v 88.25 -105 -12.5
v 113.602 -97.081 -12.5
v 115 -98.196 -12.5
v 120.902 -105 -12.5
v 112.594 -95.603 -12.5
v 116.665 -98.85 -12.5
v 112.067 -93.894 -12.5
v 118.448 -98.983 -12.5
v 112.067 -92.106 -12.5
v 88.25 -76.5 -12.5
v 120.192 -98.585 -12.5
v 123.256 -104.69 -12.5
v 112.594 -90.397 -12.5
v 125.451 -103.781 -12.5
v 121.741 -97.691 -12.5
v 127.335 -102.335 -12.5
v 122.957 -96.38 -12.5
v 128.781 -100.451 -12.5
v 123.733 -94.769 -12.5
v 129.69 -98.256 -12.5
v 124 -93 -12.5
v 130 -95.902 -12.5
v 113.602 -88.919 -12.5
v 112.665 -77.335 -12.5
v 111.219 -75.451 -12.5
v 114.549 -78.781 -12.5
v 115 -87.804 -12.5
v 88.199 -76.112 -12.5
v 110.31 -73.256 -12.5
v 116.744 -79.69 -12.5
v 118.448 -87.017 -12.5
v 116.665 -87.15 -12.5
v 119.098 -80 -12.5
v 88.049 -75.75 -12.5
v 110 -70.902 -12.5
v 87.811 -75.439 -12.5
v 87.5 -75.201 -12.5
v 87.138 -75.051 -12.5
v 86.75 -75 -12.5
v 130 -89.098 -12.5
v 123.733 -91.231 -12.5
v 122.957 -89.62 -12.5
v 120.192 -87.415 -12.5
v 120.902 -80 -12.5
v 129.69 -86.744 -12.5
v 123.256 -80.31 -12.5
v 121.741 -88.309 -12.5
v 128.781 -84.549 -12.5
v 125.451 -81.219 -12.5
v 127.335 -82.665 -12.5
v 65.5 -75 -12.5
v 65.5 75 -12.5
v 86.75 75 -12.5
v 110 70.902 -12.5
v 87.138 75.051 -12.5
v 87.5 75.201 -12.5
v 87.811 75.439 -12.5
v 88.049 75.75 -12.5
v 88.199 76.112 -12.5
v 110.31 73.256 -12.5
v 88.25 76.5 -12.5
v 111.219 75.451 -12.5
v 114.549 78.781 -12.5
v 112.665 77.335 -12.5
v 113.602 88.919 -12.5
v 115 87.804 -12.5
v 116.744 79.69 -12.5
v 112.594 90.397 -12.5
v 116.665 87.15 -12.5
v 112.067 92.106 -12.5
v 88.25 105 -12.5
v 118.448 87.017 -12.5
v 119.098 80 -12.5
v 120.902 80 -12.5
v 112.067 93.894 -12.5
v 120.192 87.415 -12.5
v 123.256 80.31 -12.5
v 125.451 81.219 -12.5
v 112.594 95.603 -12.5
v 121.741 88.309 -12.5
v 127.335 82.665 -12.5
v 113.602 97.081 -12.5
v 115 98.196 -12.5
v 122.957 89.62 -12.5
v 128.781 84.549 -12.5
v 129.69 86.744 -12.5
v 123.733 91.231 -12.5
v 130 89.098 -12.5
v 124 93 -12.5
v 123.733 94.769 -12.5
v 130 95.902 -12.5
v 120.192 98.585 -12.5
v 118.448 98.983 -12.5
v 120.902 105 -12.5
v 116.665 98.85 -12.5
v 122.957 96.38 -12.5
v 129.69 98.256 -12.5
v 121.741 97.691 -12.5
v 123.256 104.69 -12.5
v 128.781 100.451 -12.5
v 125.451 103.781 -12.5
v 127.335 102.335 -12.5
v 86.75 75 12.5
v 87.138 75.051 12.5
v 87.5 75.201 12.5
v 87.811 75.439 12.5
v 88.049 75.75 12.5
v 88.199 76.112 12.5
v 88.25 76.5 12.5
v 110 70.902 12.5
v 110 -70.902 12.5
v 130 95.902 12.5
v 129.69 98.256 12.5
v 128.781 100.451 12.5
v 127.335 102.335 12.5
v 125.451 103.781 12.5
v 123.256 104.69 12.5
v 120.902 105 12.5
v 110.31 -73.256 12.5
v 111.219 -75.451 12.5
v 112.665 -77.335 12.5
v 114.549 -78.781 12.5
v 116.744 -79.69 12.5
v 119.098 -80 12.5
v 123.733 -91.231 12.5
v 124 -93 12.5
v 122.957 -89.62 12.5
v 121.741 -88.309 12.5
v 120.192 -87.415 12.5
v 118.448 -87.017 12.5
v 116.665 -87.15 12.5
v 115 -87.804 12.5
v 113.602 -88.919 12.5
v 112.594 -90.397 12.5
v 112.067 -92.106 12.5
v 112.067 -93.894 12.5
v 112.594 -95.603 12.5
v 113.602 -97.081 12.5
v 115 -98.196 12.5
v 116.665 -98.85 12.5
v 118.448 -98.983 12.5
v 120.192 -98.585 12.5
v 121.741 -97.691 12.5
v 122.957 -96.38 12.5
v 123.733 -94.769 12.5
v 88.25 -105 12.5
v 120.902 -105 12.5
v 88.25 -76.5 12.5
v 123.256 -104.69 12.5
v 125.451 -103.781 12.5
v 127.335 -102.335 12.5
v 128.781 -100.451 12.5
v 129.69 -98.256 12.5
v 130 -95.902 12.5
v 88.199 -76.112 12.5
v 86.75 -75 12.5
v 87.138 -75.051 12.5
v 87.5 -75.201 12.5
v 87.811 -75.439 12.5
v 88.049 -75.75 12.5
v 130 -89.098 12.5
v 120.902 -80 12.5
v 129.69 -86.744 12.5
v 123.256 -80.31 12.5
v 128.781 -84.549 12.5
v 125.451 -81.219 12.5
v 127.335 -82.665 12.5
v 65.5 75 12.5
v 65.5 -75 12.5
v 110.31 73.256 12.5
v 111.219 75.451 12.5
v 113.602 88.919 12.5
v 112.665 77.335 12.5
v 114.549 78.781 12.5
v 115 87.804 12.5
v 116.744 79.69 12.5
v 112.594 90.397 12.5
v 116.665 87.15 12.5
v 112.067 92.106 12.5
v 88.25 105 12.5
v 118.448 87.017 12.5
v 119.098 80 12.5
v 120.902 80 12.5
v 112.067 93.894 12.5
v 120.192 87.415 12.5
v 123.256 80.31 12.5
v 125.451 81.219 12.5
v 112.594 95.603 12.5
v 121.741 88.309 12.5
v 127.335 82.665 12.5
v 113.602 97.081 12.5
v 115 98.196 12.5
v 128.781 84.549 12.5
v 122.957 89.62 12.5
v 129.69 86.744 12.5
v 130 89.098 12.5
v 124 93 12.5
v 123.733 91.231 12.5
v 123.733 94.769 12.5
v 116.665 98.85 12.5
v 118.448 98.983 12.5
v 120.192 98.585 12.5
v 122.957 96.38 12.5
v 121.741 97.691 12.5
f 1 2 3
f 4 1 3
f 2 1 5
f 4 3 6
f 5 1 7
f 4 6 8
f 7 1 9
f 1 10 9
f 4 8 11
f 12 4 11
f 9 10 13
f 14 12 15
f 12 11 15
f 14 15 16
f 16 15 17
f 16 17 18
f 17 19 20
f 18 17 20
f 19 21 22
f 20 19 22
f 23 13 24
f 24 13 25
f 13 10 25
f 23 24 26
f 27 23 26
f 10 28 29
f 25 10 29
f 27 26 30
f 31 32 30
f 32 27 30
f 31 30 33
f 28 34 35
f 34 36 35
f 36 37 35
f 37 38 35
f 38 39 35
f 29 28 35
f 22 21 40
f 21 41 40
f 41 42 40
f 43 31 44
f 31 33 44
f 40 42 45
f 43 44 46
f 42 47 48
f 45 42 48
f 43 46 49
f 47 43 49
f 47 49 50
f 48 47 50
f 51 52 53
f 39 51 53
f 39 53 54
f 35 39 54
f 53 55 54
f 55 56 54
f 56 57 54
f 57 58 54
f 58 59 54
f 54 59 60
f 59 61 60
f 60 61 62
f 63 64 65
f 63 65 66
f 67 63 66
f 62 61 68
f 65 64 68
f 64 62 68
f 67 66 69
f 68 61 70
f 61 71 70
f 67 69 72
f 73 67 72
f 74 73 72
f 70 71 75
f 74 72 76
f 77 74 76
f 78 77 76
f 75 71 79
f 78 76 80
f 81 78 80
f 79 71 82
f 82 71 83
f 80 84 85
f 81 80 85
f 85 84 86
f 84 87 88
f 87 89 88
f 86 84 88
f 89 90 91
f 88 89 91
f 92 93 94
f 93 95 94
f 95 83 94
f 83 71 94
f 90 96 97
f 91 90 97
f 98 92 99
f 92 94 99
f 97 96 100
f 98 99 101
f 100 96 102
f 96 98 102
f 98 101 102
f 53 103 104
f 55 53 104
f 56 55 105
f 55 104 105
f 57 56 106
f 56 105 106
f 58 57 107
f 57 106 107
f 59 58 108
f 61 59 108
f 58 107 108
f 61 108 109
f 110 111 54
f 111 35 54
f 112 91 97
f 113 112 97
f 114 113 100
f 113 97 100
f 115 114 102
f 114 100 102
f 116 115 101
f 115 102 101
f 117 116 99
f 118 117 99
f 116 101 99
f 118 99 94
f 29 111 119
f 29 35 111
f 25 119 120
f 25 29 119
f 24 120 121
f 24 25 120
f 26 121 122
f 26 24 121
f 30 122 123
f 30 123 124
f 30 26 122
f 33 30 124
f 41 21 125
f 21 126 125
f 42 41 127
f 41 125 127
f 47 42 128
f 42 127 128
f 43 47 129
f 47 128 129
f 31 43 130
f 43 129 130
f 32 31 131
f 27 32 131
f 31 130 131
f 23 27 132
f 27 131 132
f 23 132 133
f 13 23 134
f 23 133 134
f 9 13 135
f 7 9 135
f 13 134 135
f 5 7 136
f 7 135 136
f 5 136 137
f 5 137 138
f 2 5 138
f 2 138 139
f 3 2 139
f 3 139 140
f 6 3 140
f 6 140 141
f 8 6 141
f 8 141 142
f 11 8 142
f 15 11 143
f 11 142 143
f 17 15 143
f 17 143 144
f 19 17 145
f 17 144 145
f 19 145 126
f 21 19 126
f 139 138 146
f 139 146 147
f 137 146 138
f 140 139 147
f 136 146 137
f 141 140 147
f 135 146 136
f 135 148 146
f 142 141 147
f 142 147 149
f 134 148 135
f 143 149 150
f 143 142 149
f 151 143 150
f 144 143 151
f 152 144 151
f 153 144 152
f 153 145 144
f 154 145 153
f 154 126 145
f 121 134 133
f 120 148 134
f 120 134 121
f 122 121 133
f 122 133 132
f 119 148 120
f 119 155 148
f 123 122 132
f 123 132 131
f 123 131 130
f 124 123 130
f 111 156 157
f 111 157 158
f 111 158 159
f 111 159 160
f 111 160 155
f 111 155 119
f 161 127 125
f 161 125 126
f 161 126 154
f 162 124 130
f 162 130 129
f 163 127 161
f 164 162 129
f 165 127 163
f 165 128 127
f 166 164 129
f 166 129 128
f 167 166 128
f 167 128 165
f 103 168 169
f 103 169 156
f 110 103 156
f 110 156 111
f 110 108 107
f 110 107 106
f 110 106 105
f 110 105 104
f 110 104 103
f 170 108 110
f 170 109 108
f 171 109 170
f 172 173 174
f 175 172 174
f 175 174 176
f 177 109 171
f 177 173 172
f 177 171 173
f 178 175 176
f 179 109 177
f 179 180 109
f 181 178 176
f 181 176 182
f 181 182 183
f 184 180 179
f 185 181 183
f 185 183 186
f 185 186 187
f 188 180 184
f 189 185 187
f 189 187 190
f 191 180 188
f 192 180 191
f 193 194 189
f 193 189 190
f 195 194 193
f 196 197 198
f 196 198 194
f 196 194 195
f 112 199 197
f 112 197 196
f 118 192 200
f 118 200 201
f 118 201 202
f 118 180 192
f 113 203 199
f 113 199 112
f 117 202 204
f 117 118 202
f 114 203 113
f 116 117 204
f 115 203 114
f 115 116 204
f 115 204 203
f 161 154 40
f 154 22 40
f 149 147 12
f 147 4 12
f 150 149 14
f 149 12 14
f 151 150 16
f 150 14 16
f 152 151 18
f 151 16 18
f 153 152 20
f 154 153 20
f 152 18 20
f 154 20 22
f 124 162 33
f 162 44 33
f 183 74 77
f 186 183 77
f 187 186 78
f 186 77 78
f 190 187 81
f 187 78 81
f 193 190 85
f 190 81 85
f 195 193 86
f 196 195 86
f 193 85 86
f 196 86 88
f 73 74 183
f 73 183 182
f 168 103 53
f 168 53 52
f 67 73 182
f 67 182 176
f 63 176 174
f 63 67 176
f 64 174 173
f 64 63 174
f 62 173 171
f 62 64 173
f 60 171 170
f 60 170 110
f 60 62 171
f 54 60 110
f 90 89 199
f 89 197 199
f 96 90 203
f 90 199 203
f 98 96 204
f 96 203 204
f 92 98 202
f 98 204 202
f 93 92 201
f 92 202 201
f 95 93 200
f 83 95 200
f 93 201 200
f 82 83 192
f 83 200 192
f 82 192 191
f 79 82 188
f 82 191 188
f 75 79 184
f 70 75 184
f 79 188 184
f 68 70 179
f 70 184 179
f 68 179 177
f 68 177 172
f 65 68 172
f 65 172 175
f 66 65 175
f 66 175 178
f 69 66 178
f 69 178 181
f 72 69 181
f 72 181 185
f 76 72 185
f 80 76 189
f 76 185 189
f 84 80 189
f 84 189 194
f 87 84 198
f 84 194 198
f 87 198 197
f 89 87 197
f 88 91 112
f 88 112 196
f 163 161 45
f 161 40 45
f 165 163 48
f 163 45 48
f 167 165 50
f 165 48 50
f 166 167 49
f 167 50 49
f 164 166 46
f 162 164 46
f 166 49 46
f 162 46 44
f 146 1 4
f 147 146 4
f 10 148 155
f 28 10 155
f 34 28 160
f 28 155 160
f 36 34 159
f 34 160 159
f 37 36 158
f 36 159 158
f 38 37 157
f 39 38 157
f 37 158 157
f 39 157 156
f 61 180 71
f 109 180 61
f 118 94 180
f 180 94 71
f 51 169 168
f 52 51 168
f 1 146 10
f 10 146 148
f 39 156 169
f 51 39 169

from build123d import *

# Parameters (mm, degrees)
SKETCH021_R          = 33
PAD018_DEPTH         = 12.5
PAD018_DEPTH_BACK    = 12.5
SKETCH_004_R         = 6
POCKET021_DEPTH      = 20
POCKET021_DEPTH_BACK = 20
SKETCH035_W          = 175.5
SKETCH035_H          = 210
POCKET022_DEPTH      = 20
POCKET022_DEPTH_BACK = 20


with BuildPart() as part:
    # Sketch021 → Pad018 (new body, two sides)
    with BuildSketch(Plane.XY) as pad018_sk:
        with BuildLine():
            Line((-110, -105), (110, -105))
            Line((110, -105), (120.90162, -105))
            ThreePointArc((120.90162, -105), (127.335146, -102.335146), (130, -95.90162))
            Line((130, -95.90162), (130, -89.09838))
            ThreePointArc((130, -89.09838), (127.335146, -82.664854), (120.90162, -80))
            Line((120.90162, -80), (119.09838, -80))
            ThreePointArc((110, -70.90162), (112.664854, -77.335146), (119.09838, -80))
            Line((110, -70.90162), (110, 0))
            Line((110, 70.90162), (110, 0))
            ThreePointArc((119.09838, 80), (112.664854, 77.335146), (110, 70.90162))
            Line((120.90162, 80), (119.09838, 80))
            ThreePointArc((120.90162, 80), (127.335146, 82.664854), (130, 89.09838))
            Line((130, 95.90162), (130, 89.09838))
            ThreePointArc((130, 95.90162), (127.335146, 102.335146), (120.90162, 105))
            Line((110, 105), (120.90162, 105))
            Line((110, 105), (-110, 105))
            Line((-110, 105), (-110, 0))
            Line((-110, -105), (-110, 0))
        make_face()
        Circle(SKETCH021_R, mode=Mode.SUBTRACT)
    extrude(amount=-PAD018_DEPTH)
    extrude(pad018_sk.sketch, amount=PAD018_DEPTH_BACK)

    # Sketch_004 → Pocket021 (cut, two sides)
    with BuildSketch(Plane.XY) as pocket021_sk:
        with Locations((-118, 93)):
            Circle(SKETCH_004_R)
        with Locations((118, 93)):
            Circle(SKETCH_004_R)
        with Locations((-118, -93)):
            Circle(SKETCH_004_R)
        with Locations((118, -93)):
            Circle(SKETCH_004_R)
        with BuildLine():
            ThreePointArc((86.75, 75), (87.81066, 75.43934), (88.25, 76.5))
            Line((88.25, 105), (88.25, 76.5))
            Line((88.25, 105), (6.75, 105))
            Line((6.75, 105), (6.75, 76.5))
            ThreePointArc((6.75, 76.5), (7.18934, 75.43934), (8.25, 75))
            Line((86.75, 75), (8.25, 75))
        make_face()
        with BuildLine():
            ThreePointArc((-88.25, 76.5), (-87.81066, 75.43934), (-86.75, 75))
            Line((-86.75, 75), (-8.25, 75))
            ThreePointArc((-8.25, 75), (-7.18934, 75.43934), (-6.75, 76.5))
            Line((-6.75, 105), (-6.75, 76.5))
            Line((-88.25, 105), (-6.75, 105))
            Line((-88.25, 105), (-88.25, 76.5))
        make_face()
        with BuildLine():
            ThreePointArc((88.25, -76.5), (87.81066, -75.43934), (86.75, -75))
            Line((86.75, -75), (8.25, -75))
            ThreePointArc((8.25, -75), (7.18934, -75.43934), (6.75, -76.5))
            Line((6.75, -105), (6.75, -76.5))
            Line((88.25, -105), (6.75, -105))
            Line((88.25, -105), (88.25, -76.5))
        make_face()
        with BuildLine():
            ThreePointArc((-86.75, -75), (-87.81066, -75.43934), (-88.25, -76.5))
            Line((-88.25, -105), (-88.25, -76.5))
            Line((-88.25, -105), (-6.75, -105))
            Line((-6.75, -105), (-6.75, -76.5))
            ThreePointArc((-6.75, -76.5), (-7.18934, -75.43934), (-8.25, -75))
            Line((-86.75, -75), (-8.25, -75))
        make_face()
    extrude(amount=-POCKET021_DEPTH, mode=Mode.SUBTRACT)
    extrude(pocket021_sk.sketch, amount=POCKET021_DEPTH_BACK, mode=Mode.SUBTRACT)

    # Sketch035 → Pocket022 (cut, two sides)
    with BuildSketch(Plane.XY) as pocket022_sk:
        with Locations((-22.25, 0)):
            Rectangle(SKETCH035_W, SKETCH035_H)
    extrude(amount=-POCKET022_DEPTH, mode=Mode.SUBTRACT)
    extrude(pocket022_sk.sketch, amount=POCKET022_DEPTH_BACK, mode=Mode.SUBTRACT)


solid = part.part
